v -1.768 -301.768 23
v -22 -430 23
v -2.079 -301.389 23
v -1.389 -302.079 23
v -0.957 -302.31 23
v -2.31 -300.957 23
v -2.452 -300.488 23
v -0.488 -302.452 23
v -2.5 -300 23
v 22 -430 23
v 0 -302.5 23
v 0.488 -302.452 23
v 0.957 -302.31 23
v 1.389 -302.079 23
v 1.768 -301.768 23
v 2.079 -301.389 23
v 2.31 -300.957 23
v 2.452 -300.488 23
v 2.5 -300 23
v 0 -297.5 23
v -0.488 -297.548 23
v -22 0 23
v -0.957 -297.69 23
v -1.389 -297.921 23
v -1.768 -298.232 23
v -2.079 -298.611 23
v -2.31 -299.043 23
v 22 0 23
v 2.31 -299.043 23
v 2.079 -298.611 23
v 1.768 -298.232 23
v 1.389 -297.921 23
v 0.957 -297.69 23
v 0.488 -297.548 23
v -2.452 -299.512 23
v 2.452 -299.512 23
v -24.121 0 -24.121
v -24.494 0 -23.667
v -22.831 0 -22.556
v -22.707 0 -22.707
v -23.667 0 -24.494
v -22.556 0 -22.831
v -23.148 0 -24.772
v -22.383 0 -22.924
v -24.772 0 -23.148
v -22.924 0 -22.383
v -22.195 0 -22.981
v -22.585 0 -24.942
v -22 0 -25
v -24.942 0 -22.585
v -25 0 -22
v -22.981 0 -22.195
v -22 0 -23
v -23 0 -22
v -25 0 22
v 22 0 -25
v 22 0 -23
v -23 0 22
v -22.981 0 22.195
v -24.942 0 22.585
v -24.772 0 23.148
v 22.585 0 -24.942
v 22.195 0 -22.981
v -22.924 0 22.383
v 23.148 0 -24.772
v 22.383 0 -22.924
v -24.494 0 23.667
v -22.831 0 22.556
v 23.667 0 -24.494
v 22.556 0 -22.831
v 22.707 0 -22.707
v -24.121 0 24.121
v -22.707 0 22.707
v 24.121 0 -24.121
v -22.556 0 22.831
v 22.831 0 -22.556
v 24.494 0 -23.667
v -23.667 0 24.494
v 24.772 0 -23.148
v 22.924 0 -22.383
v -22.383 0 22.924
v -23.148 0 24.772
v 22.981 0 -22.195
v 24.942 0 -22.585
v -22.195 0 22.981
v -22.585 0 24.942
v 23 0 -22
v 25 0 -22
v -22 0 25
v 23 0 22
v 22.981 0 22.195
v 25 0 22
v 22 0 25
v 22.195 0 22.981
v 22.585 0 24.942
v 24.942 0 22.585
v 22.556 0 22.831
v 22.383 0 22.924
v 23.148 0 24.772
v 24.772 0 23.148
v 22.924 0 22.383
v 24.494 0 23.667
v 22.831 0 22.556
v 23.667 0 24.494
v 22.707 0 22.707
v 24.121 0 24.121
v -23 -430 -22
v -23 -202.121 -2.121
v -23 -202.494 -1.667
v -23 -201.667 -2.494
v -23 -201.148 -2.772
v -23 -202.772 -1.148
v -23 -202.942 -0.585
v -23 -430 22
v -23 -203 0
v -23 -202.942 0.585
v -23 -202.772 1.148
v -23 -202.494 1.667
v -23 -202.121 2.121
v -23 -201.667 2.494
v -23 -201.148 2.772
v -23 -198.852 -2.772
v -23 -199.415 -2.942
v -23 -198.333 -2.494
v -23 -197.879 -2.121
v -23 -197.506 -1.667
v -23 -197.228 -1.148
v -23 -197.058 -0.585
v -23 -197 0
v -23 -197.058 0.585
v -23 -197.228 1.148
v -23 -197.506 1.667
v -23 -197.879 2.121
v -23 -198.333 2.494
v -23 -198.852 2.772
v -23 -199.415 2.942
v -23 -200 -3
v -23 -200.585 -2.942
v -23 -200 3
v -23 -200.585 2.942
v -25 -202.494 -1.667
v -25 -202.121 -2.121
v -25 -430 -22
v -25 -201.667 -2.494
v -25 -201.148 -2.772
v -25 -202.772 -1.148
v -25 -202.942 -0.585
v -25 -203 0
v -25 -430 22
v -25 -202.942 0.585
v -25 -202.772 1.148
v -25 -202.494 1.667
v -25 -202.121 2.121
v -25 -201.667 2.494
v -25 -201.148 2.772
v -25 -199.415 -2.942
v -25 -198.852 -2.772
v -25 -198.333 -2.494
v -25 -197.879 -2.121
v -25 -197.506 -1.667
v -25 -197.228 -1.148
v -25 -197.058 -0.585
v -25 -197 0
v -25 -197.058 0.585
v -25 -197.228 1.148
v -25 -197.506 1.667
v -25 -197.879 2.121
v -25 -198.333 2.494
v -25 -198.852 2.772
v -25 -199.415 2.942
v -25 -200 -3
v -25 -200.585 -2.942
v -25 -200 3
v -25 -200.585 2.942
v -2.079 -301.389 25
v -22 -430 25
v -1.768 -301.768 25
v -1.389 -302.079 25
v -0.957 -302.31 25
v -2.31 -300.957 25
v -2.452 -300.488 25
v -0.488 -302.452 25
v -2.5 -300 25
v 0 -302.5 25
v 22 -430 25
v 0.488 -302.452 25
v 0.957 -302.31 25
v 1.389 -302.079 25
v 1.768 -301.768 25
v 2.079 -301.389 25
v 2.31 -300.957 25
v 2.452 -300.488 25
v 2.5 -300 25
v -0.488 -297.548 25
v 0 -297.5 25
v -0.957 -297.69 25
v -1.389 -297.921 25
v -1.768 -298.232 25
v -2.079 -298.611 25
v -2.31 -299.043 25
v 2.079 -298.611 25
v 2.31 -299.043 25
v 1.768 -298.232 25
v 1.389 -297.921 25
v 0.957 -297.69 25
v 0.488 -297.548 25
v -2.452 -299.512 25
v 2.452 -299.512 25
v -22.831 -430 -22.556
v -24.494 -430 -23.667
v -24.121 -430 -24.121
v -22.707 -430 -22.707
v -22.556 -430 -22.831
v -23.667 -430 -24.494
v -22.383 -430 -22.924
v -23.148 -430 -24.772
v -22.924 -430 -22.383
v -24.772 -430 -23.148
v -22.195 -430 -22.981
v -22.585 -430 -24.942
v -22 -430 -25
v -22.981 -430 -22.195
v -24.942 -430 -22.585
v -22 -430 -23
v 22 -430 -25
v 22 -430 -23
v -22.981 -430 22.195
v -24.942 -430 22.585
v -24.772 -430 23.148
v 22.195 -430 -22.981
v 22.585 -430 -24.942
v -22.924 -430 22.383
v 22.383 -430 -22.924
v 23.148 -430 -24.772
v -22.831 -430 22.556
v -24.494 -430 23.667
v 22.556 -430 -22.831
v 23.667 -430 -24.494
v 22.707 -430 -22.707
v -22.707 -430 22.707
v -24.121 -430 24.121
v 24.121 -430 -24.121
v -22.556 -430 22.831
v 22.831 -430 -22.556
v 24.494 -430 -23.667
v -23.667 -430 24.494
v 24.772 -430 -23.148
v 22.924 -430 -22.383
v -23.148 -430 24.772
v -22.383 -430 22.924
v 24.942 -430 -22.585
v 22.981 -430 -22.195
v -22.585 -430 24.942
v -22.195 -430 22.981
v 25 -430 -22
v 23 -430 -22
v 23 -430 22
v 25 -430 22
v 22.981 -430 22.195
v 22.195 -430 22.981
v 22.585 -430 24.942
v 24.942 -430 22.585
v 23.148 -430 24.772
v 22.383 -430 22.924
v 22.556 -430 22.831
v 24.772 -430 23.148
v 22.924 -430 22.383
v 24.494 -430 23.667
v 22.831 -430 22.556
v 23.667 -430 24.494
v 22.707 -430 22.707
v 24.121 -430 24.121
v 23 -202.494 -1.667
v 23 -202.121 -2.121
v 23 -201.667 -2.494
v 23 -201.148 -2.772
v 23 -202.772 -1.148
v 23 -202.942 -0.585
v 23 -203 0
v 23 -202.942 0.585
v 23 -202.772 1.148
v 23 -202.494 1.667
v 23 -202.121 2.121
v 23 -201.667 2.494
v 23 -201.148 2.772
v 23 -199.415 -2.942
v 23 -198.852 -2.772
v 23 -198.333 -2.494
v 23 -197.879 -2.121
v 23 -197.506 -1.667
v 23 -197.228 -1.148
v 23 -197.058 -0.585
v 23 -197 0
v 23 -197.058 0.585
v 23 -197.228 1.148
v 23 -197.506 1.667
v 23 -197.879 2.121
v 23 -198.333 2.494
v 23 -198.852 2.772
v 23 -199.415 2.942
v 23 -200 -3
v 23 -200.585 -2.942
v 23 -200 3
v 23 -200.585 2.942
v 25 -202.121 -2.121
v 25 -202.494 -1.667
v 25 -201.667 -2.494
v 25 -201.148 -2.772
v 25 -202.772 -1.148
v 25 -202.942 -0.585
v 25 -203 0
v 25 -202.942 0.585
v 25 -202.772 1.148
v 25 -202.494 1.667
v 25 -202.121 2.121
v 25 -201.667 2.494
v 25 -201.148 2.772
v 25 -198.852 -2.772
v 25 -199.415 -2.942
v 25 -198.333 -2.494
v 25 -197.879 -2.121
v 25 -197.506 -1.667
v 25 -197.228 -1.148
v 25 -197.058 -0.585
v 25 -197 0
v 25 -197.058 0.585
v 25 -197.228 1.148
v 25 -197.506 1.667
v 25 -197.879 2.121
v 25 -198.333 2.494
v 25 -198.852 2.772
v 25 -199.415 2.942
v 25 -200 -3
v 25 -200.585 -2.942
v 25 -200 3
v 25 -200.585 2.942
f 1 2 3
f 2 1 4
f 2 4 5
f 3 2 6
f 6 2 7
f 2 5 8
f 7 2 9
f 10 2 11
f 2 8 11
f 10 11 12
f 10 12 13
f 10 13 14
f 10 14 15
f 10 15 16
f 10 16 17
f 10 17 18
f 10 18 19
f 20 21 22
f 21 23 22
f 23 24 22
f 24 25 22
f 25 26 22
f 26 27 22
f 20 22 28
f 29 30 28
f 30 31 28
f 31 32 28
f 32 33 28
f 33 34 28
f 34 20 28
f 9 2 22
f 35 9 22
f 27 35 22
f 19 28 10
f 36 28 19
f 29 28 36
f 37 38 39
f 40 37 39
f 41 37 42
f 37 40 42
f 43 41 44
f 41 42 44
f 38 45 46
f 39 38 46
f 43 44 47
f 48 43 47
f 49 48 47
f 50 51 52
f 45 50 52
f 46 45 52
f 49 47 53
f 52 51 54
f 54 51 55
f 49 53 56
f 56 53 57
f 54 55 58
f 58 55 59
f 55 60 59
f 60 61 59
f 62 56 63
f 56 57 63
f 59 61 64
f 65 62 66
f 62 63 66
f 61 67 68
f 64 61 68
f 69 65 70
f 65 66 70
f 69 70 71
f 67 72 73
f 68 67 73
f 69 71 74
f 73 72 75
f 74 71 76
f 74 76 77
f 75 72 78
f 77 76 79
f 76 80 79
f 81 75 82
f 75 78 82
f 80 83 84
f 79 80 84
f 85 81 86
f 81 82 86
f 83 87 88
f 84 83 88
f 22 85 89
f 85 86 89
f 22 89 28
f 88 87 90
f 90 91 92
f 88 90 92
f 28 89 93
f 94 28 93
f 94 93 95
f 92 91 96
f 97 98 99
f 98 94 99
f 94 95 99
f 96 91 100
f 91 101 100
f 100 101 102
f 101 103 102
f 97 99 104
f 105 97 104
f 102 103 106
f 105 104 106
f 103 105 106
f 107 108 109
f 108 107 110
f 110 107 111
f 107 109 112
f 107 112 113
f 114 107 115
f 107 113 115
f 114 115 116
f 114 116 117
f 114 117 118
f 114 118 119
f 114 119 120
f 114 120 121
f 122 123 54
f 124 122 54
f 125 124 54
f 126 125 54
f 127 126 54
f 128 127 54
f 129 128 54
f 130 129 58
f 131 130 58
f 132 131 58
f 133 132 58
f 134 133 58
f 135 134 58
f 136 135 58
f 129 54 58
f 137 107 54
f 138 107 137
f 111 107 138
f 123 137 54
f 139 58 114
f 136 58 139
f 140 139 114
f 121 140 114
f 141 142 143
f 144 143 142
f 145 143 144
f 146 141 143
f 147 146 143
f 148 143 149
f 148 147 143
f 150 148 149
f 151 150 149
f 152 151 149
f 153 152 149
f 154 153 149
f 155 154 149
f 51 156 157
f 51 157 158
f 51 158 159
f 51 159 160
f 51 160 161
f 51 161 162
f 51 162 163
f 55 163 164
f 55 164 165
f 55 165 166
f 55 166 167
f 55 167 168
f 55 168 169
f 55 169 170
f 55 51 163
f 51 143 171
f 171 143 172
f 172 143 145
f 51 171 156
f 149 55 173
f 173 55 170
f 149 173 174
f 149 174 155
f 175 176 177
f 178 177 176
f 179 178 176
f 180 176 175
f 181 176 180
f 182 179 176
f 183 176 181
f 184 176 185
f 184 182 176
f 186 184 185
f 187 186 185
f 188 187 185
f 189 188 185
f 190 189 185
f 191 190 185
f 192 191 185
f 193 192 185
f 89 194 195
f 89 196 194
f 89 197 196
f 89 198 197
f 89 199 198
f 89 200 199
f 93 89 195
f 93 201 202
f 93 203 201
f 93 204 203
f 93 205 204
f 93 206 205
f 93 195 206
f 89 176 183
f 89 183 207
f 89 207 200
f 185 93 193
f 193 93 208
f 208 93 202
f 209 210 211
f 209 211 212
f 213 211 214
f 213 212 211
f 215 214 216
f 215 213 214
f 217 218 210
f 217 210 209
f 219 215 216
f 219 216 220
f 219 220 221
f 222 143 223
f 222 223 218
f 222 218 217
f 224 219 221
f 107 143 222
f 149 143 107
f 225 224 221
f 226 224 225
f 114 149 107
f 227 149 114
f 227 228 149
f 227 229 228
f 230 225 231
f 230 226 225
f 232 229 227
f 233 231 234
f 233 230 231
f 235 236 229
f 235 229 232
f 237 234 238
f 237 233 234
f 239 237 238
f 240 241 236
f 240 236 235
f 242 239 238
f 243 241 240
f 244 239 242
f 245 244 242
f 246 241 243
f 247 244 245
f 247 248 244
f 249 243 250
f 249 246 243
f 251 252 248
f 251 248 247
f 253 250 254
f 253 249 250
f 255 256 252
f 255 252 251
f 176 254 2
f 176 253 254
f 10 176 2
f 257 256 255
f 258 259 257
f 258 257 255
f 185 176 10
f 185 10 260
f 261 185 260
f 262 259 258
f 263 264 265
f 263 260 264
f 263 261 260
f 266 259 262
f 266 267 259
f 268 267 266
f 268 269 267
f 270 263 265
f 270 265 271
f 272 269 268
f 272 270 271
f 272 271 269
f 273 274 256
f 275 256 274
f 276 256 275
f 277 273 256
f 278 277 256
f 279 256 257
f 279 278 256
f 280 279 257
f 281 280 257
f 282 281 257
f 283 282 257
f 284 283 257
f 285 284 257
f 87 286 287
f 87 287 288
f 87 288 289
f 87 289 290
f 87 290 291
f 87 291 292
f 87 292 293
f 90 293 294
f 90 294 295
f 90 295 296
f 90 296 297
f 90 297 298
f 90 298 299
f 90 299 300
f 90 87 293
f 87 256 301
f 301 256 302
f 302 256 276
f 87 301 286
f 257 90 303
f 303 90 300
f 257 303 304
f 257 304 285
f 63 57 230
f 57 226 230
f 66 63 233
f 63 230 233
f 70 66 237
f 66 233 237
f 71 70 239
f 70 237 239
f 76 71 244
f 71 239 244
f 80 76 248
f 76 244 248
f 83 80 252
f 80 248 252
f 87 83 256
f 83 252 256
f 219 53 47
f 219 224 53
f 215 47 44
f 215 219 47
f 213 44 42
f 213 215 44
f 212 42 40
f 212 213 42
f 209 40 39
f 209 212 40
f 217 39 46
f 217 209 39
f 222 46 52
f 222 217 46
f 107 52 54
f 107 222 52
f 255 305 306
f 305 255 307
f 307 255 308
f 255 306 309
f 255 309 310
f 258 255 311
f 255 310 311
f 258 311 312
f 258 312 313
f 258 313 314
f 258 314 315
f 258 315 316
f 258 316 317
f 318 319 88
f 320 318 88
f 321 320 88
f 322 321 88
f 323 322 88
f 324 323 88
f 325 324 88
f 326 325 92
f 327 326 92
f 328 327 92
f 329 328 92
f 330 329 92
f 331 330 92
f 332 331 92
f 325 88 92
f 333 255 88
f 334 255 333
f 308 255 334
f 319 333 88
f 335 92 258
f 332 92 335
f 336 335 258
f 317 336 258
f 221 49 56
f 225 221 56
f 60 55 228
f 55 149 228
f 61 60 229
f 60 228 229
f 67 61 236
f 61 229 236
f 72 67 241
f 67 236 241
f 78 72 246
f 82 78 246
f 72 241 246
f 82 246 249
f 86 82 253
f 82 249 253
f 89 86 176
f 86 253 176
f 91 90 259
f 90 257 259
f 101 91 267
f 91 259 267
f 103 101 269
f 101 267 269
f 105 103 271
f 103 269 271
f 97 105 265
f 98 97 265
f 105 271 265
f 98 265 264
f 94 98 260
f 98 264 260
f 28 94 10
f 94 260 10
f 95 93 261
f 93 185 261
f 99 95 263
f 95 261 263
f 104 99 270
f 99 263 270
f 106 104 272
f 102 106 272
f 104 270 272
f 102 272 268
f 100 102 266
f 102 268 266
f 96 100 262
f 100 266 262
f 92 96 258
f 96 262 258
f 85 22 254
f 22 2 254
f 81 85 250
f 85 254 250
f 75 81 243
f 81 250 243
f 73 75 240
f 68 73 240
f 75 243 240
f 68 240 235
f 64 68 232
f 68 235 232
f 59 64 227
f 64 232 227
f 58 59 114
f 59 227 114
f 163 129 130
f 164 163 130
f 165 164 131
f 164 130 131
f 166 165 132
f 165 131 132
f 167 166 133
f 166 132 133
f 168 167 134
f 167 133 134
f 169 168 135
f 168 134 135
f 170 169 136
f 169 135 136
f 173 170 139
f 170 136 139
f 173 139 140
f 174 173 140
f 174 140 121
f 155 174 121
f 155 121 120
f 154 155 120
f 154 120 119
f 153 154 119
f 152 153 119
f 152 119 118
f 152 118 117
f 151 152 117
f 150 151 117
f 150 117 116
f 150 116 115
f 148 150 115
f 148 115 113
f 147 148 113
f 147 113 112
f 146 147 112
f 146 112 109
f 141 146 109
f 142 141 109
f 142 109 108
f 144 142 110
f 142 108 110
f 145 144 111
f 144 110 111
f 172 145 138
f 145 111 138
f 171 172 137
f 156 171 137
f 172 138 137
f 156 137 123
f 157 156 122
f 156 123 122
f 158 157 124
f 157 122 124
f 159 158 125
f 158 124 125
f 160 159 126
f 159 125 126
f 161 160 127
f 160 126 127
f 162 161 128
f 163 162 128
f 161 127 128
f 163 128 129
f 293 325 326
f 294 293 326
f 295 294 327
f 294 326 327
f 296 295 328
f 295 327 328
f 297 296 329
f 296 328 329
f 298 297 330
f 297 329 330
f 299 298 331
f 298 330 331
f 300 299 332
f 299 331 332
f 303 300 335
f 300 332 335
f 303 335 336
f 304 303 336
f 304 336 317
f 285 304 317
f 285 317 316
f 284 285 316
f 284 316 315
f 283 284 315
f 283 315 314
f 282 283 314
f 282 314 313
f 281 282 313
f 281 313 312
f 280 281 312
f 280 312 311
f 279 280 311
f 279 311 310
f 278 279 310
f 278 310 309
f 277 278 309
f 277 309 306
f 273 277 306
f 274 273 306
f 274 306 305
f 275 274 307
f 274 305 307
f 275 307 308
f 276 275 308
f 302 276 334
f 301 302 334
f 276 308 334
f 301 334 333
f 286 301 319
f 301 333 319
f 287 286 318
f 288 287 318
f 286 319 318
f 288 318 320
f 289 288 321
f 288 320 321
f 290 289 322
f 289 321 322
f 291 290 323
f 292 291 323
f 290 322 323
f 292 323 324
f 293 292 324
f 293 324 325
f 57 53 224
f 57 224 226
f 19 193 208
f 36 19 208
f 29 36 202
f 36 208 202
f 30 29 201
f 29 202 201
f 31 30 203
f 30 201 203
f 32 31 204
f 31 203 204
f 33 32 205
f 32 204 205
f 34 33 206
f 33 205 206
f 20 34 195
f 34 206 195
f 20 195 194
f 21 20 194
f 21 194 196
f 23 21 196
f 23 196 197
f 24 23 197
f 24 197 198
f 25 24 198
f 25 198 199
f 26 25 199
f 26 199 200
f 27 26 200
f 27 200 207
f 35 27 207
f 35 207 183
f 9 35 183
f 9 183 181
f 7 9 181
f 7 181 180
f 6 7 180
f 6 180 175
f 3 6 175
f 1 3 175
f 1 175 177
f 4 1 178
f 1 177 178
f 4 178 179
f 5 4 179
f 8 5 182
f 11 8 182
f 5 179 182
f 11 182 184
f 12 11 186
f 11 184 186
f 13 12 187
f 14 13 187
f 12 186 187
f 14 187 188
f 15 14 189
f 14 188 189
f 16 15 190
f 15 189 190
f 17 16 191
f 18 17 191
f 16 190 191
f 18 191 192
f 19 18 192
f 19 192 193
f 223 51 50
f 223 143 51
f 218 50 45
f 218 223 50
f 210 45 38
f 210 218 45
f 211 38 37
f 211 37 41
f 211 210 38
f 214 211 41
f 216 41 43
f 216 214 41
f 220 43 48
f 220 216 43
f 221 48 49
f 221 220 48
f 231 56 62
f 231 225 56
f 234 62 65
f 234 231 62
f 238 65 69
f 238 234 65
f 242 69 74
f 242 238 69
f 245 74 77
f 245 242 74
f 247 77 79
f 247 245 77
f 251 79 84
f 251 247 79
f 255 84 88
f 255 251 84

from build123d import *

# Parameters (mm, degrees)
F0_W     = 50
F0_H     = 50
F0_W_2   = 46
F0_H_2   = 46
F1_DEPTH = 430
F2_R     = 1
F3_R     = 3
F4_R     = 2.5
F5_DEPTH = 5
F6_R     = 3
F7_DEPTH = 50.001


with BuildPart() as f1:
    # F0 (on Front) → F1 (new body)
    with BuildSketch(Plane.XZ):
        Rectangle(F0_W, F0_H)
        Rectangle(F0_W_2, F0_H_2, mode=Mode.SUBTRACT)
    extrude(amount=F1_DEPTH)

    # F2
    f2_edges = [f1.edges().sort_by_distance(p)[0] for p in [
        (-23, -215, 23),
        (23, -215, 23),
        (23, -215, -23),
        (-23, -215, -23),
    ]]
    fillet(f2_edges, radius=F2_R)

    # F3
    f3_edges = [f1.edges().sort_by_distance(p)[0] for p in [
        (25, -215, 25),
        (-25, -215, 25),
        (25, -215, -25),
        (-25, -215, -25),
    ]]
    fillet(f3_edges, radius=F3_R)

    # F4 (on face) → F5 (cut)
    with BuildSketch(Plane.XY.offset(25)):
        with Locations((0, -300)):
            Circle(F4_R)
    extrude(amount=-F5_DEPTH, mode=Mode.SUBTRACT)

    # F6 (on face) → F7 (cut, through all)
    with BuildSketch(Plane.YZ.offset(25)):
        with Locations((-200, 0)):
            Circle(F6_R)
    extrude(amount=-F7_DEPTH, mode=Mode.SUBTRACT)


solid = f1.part
